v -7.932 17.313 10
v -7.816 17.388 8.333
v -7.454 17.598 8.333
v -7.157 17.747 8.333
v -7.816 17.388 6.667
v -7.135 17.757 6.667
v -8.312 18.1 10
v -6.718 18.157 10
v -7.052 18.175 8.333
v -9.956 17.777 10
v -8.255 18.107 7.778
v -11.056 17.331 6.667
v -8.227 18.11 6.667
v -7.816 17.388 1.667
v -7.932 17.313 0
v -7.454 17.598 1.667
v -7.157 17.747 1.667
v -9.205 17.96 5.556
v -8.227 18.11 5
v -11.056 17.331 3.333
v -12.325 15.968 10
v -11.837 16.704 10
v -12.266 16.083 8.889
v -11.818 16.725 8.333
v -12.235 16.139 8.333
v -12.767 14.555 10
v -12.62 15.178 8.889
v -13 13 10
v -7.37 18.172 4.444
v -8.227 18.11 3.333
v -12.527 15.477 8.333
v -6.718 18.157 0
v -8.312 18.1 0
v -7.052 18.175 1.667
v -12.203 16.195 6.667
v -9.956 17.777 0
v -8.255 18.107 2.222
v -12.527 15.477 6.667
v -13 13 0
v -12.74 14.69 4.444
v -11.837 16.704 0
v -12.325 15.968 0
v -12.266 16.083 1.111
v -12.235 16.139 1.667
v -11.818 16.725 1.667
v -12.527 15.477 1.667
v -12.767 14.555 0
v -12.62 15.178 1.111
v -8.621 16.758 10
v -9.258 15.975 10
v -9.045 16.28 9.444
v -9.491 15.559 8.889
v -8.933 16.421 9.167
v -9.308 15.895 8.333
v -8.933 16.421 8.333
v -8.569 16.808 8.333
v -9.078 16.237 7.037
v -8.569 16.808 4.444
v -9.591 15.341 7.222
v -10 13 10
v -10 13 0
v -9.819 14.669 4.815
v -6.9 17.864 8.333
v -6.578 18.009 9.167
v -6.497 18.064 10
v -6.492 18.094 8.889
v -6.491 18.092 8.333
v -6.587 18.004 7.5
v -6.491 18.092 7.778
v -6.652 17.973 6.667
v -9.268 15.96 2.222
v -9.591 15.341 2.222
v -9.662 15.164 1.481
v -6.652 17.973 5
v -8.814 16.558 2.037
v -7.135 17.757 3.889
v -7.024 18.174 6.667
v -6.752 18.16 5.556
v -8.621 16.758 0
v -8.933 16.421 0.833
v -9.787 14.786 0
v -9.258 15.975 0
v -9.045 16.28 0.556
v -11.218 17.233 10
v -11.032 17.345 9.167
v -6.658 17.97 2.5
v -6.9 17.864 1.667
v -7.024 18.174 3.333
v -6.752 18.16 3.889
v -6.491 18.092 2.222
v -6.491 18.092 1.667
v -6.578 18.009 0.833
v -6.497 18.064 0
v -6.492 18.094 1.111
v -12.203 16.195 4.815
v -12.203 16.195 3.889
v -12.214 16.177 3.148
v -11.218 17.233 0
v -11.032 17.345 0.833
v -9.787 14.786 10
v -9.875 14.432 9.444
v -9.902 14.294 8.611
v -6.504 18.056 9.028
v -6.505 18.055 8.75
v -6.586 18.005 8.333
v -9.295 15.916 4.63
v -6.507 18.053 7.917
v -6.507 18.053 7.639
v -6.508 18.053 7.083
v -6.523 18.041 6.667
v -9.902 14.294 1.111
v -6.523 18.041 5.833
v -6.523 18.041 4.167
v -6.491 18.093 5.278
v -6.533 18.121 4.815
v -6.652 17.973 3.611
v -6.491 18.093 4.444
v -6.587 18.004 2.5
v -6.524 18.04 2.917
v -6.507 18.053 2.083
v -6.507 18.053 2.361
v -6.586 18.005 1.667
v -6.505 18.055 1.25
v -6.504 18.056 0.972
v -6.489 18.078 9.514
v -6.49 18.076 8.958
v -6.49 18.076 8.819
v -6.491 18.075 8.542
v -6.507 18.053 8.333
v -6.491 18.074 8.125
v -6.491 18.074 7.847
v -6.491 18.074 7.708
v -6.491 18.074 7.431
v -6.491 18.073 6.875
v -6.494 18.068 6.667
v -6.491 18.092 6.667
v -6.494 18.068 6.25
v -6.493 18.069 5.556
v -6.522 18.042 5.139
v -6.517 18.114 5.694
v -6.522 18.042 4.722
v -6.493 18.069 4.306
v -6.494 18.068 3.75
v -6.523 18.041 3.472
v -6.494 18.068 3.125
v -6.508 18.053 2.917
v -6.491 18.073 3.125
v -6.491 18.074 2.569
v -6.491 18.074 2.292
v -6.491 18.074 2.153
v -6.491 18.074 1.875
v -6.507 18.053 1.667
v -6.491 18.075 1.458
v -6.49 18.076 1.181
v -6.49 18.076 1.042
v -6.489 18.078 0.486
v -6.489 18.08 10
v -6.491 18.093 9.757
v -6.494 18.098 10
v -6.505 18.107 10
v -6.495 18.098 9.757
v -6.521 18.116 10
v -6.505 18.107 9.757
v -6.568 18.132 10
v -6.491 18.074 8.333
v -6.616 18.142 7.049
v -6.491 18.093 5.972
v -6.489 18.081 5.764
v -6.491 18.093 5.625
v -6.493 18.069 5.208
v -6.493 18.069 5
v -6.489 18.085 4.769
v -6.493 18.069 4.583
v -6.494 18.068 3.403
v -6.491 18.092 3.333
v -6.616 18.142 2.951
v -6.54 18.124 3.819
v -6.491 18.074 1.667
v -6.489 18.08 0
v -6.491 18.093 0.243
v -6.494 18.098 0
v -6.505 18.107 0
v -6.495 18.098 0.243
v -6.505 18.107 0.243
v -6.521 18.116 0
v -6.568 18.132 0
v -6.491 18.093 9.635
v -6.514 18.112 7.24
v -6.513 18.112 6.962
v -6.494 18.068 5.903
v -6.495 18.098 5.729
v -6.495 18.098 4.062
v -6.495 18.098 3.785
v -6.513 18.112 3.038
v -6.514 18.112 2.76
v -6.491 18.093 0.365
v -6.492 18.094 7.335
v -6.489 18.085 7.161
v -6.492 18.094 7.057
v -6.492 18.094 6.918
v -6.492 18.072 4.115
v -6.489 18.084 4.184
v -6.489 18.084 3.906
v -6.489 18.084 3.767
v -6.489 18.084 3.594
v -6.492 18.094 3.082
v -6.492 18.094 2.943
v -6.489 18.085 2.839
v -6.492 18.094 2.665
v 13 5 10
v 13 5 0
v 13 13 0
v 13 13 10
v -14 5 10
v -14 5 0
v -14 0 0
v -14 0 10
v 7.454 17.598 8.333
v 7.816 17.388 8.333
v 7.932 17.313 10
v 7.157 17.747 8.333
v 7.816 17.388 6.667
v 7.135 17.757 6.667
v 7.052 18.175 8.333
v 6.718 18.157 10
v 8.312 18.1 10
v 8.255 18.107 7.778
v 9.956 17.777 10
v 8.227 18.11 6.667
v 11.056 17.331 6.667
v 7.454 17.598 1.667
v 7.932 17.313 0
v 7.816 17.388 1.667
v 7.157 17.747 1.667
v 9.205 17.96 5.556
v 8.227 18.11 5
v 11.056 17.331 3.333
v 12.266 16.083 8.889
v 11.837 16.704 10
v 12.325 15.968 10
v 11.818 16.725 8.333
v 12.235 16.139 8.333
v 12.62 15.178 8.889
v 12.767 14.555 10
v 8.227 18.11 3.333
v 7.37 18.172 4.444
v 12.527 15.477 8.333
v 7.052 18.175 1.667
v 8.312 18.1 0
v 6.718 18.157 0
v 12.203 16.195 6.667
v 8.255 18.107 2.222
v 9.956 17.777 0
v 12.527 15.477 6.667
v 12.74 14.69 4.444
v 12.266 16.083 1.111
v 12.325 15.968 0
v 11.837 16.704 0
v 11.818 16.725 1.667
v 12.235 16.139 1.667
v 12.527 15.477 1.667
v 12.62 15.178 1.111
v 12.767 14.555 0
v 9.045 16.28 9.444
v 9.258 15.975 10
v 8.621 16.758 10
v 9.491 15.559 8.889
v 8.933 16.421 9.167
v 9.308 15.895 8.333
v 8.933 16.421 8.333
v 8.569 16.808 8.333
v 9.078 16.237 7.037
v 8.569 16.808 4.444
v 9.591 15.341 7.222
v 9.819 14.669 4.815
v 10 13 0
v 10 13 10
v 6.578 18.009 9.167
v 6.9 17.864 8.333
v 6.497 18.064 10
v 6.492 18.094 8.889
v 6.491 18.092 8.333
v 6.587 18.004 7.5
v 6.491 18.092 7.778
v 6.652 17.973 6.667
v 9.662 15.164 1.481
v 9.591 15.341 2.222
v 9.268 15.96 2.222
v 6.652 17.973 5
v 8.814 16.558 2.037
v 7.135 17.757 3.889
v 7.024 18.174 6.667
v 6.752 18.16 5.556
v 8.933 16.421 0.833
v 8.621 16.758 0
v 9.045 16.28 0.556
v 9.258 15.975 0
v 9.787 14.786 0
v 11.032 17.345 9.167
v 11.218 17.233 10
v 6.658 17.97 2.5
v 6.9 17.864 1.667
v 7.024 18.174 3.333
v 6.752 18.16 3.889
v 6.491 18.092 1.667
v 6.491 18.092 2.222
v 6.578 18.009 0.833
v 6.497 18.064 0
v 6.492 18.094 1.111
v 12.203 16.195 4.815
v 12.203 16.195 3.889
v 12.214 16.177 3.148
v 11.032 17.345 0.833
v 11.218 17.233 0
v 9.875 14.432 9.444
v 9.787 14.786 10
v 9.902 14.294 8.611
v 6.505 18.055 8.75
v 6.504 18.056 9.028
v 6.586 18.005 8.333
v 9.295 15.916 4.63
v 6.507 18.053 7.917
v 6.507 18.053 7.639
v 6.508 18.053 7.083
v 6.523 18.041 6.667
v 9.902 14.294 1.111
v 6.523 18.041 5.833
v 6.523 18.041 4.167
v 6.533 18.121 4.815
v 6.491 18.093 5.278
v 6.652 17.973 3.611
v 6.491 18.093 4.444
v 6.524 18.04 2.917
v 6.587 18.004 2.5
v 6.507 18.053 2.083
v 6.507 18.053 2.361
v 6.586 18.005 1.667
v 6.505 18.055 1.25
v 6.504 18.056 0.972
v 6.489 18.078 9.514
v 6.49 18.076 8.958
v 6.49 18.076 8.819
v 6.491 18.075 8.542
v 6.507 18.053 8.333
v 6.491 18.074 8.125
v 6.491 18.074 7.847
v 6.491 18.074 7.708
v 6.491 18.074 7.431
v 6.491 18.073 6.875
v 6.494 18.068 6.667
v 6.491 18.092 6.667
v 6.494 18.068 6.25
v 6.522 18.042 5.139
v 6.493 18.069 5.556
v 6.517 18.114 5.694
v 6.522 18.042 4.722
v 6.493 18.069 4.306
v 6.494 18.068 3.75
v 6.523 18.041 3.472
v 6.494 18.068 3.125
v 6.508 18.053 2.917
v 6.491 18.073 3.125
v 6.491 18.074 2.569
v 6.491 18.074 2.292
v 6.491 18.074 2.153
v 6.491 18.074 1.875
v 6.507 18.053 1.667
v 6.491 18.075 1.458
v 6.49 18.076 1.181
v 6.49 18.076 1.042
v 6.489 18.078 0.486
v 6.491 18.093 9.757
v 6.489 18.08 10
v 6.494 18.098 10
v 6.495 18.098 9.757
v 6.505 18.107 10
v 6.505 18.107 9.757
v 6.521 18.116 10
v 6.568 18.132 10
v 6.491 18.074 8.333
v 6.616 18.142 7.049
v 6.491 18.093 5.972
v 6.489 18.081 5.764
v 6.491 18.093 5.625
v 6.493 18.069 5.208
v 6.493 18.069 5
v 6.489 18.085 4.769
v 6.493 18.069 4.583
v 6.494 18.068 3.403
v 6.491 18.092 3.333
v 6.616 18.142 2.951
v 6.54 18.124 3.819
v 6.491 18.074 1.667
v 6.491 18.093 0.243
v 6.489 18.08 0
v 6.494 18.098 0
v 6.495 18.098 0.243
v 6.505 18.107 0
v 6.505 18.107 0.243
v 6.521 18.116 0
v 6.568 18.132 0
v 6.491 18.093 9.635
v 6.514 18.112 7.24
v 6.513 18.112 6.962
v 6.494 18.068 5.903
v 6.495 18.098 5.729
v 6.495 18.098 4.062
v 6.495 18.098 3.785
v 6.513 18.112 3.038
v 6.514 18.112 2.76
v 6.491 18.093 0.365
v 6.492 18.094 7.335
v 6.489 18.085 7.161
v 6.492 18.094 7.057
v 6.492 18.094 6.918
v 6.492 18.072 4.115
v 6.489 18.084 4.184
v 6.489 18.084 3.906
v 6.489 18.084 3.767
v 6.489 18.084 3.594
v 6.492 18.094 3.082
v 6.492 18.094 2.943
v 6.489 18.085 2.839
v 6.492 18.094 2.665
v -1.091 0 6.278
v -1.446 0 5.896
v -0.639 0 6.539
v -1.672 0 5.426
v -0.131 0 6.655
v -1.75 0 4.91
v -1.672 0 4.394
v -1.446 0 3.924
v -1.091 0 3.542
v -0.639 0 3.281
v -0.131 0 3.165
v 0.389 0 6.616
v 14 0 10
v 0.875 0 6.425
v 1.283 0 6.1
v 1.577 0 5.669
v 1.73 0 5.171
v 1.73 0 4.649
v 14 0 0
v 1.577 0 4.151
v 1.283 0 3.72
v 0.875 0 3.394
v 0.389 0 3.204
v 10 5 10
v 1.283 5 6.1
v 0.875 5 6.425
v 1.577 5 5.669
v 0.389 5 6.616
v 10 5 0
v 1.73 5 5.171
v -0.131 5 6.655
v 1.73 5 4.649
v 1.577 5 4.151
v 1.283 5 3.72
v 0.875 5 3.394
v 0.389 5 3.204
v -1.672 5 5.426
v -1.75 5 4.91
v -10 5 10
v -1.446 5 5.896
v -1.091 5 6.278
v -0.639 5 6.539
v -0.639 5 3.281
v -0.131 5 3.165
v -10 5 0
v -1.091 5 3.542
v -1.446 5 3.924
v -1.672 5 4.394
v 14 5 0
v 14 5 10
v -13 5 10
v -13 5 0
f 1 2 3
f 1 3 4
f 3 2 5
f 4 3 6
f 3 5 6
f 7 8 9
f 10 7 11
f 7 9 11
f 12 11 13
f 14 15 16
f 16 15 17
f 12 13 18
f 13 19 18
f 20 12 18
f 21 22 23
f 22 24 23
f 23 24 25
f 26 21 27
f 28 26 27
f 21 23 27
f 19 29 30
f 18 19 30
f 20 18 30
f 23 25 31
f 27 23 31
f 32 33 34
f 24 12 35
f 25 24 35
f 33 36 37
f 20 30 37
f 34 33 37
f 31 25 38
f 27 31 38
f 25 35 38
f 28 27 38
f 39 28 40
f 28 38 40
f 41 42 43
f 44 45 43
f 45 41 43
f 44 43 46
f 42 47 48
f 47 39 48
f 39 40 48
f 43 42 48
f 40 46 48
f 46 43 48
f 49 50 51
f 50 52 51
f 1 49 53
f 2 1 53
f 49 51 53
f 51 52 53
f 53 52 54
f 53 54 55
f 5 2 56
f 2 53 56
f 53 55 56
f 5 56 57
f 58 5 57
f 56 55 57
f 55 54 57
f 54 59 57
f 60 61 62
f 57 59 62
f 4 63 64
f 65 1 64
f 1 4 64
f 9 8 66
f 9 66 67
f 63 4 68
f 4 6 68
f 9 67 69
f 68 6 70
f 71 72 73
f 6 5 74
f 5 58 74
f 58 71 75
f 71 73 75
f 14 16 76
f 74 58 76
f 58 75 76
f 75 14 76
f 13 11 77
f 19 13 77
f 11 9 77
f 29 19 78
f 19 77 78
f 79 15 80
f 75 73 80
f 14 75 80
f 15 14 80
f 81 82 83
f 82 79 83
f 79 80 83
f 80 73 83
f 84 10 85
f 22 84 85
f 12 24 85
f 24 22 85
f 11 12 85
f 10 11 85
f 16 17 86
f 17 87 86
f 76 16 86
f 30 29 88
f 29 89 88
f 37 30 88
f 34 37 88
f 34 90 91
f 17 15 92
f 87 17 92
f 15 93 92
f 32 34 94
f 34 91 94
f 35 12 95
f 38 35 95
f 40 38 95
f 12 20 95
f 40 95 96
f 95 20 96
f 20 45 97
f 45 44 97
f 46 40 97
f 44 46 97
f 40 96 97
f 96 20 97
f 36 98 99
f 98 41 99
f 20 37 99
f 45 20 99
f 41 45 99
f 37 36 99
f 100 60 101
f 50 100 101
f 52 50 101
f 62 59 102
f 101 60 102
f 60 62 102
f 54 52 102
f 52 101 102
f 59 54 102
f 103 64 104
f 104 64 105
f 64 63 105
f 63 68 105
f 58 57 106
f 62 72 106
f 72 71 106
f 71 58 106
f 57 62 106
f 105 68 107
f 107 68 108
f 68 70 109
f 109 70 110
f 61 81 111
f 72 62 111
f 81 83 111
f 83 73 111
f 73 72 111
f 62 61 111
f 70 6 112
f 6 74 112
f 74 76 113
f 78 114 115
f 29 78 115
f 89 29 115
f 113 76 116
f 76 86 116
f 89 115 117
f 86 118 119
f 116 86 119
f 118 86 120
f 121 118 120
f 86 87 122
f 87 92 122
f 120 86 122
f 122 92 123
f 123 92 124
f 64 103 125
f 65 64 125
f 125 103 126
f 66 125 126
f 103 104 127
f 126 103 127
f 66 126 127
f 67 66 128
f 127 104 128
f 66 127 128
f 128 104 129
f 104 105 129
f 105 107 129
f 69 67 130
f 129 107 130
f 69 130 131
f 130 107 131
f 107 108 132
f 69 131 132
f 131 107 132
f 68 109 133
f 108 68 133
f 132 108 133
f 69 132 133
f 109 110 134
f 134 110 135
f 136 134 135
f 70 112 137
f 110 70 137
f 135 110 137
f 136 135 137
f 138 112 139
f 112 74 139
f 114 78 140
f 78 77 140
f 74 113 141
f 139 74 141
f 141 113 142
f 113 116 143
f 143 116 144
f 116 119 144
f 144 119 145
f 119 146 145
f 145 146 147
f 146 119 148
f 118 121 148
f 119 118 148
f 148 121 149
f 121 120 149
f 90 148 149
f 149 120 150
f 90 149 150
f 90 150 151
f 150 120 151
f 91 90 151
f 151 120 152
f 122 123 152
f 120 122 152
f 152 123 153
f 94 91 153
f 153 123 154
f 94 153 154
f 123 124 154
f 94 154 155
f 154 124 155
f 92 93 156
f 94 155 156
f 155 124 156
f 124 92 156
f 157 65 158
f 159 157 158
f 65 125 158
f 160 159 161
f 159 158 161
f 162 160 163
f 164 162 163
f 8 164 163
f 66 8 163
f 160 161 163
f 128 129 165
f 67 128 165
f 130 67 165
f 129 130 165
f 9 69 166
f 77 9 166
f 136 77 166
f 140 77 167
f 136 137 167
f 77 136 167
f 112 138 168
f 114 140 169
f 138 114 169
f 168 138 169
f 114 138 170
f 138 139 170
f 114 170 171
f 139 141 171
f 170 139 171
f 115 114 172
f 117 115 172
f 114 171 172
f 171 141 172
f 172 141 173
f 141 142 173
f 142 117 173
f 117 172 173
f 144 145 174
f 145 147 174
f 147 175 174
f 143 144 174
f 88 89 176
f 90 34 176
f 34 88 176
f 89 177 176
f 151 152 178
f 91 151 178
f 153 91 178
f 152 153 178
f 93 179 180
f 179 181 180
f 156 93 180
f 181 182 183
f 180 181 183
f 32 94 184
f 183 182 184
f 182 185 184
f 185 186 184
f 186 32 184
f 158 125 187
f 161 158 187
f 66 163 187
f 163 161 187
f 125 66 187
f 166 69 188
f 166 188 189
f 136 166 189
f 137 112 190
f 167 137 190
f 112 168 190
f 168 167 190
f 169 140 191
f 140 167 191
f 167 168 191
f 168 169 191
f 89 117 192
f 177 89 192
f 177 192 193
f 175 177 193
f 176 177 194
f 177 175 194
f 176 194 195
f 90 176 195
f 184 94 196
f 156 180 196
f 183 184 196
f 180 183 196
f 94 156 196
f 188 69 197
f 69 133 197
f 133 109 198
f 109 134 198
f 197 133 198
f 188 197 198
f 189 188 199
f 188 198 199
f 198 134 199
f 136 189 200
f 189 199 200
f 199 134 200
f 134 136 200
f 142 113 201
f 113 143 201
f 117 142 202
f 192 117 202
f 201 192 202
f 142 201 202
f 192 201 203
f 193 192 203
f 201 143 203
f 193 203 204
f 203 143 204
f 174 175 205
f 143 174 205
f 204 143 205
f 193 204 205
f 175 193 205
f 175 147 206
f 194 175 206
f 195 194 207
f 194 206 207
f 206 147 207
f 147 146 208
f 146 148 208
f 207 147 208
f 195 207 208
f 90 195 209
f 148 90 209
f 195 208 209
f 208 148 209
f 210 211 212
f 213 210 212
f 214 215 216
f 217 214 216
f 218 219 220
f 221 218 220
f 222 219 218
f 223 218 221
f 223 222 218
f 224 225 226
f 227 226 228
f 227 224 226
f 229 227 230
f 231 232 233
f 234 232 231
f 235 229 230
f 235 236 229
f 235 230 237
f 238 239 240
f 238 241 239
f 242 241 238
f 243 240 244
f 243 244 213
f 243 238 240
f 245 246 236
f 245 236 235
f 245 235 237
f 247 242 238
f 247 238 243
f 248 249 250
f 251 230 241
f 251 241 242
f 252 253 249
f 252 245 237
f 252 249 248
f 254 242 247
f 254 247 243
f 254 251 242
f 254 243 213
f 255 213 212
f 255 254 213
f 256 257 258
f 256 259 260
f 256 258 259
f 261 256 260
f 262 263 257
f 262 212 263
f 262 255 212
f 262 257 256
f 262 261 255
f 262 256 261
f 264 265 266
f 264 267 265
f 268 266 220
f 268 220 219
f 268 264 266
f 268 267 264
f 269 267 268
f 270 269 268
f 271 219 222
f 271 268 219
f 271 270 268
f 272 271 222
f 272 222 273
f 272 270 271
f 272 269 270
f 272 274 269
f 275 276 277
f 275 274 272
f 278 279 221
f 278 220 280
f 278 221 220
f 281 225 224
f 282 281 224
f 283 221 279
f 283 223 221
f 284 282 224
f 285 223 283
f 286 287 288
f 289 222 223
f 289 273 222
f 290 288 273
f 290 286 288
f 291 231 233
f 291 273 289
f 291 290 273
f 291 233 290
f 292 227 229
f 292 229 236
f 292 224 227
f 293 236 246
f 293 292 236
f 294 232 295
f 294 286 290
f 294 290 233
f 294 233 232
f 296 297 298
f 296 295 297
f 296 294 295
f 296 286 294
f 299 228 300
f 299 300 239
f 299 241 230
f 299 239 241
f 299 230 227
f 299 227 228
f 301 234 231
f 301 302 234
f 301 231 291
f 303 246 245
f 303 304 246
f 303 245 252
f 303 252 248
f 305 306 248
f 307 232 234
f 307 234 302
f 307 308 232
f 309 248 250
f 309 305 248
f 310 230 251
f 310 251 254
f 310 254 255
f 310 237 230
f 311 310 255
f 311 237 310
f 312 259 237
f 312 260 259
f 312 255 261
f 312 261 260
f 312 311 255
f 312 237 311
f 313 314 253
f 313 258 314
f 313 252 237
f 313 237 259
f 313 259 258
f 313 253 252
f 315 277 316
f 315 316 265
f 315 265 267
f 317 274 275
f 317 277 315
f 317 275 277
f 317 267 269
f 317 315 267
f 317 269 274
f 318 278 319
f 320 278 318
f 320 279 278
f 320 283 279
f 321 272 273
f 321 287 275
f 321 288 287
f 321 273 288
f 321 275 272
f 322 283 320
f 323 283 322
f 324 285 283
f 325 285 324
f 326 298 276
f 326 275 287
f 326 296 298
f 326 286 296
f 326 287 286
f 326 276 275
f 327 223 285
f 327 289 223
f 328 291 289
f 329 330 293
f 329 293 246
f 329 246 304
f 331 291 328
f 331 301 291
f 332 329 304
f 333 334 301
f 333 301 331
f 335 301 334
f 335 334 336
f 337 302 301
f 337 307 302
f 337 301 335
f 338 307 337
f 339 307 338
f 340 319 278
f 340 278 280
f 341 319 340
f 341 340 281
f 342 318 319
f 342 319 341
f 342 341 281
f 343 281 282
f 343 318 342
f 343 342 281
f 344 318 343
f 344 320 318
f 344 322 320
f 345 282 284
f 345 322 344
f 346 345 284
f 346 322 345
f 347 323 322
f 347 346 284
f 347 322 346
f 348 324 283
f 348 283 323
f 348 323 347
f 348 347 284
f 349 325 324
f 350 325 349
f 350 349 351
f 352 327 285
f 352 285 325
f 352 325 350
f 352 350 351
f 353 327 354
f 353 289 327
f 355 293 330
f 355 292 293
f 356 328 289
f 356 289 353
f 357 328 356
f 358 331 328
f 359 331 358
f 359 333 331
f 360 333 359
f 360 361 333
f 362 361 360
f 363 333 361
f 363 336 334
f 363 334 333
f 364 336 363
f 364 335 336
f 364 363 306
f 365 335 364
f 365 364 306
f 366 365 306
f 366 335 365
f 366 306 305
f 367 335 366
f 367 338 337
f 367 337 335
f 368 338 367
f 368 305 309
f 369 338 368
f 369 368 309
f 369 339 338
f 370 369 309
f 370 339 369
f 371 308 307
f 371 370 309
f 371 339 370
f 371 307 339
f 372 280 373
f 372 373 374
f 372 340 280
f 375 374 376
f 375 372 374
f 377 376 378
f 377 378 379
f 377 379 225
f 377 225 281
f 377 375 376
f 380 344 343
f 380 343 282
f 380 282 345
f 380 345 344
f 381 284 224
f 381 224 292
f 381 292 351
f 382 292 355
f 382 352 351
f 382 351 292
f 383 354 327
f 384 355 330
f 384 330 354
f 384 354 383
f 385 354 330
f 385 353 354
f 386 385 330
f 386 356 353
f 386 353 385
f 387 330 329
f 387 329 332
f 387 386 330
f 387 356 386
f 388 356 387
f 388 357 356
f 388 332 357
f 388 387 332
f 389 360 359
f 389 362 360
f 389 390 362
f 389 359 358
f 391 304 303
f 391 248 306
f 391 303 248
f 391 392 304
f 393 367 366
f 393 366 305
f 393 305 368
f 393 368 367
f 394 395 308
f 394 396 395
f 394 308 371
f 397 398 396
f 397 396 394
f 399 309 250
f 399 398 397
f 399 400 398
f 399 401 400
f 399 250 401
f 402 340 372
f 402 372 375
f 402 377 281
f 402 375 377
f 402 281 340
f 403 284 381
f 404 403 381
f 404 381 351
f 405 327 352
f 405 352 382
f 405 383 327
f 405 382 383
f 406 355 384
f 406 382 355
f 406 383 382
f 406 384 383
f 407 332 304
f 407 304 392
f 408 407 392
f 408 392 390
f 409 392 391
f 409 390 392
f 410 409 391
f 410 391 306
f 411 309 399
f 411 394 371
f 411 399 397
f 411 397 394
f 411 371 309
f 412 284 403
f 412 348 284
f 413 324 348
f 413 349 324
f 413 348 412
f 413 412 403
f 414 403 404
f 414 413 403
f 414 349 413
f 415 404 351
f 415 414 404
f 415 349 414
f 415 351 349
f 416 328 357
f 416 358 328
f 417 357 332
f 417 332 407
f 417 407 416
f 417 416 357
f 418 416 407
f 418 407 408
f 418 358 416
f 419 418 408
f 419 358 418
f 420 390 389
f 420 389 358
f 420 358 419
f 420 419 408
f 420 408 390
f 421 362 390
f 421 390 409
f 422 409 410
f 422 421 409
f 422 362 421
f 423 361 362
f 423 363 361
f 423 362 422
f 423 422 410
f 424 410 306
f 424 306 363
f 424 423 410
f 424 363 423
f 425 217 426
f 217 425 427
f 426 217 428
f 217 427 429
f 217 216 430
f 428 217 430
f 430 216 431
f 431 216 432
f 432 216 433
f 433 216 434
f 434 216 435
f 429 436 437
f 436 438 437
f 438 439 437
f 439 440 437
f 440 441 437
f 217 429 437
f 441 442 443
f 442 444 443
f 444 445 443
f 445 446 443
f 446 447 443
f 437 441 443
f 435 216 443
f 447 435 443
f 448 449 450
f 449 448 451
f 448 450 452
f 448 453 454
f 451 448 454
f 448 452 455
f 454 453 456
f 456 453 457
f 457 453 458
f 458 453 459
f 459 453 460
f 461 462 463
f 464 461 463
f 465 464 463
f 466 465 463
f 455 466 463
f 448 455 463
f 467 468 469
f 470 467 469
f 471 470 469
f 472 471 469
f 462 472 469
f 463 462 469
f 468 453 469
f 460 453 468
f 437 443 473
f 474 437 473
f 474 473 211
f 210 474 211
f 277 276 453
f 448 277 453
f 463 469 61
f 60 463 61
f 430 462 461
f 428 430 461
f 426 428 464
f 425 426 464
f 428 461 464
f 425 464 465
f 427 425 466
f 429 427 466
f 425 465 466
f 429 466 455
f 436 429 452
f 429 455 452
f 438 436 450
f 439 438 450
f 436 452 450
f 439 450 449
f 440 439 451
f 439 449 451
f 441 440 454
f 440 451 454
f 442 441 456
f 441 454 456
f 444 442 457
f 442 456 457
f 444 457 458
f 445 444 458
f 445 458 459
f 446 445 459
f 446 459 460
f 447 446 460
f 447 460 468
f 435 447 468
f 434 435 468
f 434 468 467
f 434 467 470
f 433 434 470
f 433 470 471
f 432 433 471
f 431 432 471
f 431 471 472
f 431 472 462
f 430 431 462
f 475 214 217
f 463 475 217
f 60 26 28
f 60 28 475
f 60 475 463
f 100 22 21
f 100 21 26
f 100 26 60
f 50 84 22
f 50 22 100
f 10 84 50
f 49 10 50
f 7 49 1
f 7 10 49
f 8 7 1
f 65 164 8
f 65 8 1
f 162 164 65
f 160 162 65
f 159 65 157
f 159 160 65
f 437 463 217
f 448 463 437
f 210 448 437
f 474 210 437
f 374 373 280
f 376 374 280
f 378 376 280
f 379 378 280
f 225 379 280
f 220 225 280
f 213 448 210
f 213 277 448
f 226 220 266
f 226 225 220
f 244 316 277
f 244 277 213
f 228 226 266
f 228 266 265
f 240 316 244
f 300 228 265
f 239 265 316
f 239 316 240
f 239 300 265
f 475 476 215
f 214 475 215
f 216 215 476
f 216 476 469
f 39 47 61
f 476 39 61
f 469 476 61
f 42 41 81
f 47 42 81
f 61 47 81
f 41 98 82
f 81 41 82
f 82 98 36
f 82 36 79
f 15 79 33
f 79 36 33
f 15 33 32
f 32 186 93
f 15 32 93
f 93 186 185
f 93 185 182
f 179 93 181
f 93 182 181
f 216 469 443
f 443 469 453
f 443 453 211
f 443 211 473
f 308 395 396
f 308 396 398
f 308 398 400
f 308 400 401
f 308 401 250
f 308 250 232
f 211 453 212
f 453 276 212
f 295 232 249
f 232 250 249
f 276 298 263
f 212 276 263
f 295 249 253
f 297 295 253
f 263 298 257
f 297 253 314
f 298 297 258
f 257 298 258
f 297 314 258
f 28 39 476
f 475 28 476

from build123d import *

# Parameters (mm, degrees)
F1_DEPTH = 10
F3_D     = 3.5
F3_DEPTH = 20
F3_TIP   = 1.0515060833


with BuildPart() as f1:
    # F0 (on Top) → F1 (new body)
    with BuildSketch(Plane.XY):
        Polygon((0, 0), (14, 0), (14, 5), (13, 5), (10, 5), (-10, 5), (-13, 5), (-14, 5), (-14, 0), align=None)
        with BuildLine():
            Line((10, 5), (13, 5))
            Line((13, 5), (13, 13))
            add(Edge.make_bspline(
                [(10, 13), (10.0875152242, 17.3310754155), (3.1900581528, 18.3531665627), (12.4792576098, 18.1416594137), (12.7652252364, 14.7197898641), (13, 13)],
                knots=[0, 0, 0, 0, 0.3647942323, 0.6803735299, 1, 1, 1, 1], degree=3))
            Line((10, 13), (10, 5))
        make_face()
        with BuildLine():
            Line((-13, 5), (-10, 5))
            Line((-10, 5), (-10, 13))
            add(Edge.make_bspline(
                [(-10, 13), (-10.0875152242, 17.3310754155), (-3.1900581528, 18.3531665627), (-12.4792576098, 18.1416594137), (-12.7652252364, 14.7197898641), (-13, 13)],
                knots=[0, 0, 0, 0, 0.3647942323, 0.6803735299, 1, 1, 1, 1], degree=3))
            Line((-13, 13), (-13, 5))
        make_face()
    extrude(amount=F1_DEPTH)

    # F3
    with Locations(Plane.XZ):
        with Locations((0, 4.9098548479)):
            Hole(F3_D / 2, depth=F3_DEPTH)
            with Locations((0, 0, -(F3_DEPTH + F3_TIP / 2))):  # 118° drill point
                Cone(0, F3_D / 2, F3_TIP, mode=Mode.SUBTRACT)


solid = f1.part
